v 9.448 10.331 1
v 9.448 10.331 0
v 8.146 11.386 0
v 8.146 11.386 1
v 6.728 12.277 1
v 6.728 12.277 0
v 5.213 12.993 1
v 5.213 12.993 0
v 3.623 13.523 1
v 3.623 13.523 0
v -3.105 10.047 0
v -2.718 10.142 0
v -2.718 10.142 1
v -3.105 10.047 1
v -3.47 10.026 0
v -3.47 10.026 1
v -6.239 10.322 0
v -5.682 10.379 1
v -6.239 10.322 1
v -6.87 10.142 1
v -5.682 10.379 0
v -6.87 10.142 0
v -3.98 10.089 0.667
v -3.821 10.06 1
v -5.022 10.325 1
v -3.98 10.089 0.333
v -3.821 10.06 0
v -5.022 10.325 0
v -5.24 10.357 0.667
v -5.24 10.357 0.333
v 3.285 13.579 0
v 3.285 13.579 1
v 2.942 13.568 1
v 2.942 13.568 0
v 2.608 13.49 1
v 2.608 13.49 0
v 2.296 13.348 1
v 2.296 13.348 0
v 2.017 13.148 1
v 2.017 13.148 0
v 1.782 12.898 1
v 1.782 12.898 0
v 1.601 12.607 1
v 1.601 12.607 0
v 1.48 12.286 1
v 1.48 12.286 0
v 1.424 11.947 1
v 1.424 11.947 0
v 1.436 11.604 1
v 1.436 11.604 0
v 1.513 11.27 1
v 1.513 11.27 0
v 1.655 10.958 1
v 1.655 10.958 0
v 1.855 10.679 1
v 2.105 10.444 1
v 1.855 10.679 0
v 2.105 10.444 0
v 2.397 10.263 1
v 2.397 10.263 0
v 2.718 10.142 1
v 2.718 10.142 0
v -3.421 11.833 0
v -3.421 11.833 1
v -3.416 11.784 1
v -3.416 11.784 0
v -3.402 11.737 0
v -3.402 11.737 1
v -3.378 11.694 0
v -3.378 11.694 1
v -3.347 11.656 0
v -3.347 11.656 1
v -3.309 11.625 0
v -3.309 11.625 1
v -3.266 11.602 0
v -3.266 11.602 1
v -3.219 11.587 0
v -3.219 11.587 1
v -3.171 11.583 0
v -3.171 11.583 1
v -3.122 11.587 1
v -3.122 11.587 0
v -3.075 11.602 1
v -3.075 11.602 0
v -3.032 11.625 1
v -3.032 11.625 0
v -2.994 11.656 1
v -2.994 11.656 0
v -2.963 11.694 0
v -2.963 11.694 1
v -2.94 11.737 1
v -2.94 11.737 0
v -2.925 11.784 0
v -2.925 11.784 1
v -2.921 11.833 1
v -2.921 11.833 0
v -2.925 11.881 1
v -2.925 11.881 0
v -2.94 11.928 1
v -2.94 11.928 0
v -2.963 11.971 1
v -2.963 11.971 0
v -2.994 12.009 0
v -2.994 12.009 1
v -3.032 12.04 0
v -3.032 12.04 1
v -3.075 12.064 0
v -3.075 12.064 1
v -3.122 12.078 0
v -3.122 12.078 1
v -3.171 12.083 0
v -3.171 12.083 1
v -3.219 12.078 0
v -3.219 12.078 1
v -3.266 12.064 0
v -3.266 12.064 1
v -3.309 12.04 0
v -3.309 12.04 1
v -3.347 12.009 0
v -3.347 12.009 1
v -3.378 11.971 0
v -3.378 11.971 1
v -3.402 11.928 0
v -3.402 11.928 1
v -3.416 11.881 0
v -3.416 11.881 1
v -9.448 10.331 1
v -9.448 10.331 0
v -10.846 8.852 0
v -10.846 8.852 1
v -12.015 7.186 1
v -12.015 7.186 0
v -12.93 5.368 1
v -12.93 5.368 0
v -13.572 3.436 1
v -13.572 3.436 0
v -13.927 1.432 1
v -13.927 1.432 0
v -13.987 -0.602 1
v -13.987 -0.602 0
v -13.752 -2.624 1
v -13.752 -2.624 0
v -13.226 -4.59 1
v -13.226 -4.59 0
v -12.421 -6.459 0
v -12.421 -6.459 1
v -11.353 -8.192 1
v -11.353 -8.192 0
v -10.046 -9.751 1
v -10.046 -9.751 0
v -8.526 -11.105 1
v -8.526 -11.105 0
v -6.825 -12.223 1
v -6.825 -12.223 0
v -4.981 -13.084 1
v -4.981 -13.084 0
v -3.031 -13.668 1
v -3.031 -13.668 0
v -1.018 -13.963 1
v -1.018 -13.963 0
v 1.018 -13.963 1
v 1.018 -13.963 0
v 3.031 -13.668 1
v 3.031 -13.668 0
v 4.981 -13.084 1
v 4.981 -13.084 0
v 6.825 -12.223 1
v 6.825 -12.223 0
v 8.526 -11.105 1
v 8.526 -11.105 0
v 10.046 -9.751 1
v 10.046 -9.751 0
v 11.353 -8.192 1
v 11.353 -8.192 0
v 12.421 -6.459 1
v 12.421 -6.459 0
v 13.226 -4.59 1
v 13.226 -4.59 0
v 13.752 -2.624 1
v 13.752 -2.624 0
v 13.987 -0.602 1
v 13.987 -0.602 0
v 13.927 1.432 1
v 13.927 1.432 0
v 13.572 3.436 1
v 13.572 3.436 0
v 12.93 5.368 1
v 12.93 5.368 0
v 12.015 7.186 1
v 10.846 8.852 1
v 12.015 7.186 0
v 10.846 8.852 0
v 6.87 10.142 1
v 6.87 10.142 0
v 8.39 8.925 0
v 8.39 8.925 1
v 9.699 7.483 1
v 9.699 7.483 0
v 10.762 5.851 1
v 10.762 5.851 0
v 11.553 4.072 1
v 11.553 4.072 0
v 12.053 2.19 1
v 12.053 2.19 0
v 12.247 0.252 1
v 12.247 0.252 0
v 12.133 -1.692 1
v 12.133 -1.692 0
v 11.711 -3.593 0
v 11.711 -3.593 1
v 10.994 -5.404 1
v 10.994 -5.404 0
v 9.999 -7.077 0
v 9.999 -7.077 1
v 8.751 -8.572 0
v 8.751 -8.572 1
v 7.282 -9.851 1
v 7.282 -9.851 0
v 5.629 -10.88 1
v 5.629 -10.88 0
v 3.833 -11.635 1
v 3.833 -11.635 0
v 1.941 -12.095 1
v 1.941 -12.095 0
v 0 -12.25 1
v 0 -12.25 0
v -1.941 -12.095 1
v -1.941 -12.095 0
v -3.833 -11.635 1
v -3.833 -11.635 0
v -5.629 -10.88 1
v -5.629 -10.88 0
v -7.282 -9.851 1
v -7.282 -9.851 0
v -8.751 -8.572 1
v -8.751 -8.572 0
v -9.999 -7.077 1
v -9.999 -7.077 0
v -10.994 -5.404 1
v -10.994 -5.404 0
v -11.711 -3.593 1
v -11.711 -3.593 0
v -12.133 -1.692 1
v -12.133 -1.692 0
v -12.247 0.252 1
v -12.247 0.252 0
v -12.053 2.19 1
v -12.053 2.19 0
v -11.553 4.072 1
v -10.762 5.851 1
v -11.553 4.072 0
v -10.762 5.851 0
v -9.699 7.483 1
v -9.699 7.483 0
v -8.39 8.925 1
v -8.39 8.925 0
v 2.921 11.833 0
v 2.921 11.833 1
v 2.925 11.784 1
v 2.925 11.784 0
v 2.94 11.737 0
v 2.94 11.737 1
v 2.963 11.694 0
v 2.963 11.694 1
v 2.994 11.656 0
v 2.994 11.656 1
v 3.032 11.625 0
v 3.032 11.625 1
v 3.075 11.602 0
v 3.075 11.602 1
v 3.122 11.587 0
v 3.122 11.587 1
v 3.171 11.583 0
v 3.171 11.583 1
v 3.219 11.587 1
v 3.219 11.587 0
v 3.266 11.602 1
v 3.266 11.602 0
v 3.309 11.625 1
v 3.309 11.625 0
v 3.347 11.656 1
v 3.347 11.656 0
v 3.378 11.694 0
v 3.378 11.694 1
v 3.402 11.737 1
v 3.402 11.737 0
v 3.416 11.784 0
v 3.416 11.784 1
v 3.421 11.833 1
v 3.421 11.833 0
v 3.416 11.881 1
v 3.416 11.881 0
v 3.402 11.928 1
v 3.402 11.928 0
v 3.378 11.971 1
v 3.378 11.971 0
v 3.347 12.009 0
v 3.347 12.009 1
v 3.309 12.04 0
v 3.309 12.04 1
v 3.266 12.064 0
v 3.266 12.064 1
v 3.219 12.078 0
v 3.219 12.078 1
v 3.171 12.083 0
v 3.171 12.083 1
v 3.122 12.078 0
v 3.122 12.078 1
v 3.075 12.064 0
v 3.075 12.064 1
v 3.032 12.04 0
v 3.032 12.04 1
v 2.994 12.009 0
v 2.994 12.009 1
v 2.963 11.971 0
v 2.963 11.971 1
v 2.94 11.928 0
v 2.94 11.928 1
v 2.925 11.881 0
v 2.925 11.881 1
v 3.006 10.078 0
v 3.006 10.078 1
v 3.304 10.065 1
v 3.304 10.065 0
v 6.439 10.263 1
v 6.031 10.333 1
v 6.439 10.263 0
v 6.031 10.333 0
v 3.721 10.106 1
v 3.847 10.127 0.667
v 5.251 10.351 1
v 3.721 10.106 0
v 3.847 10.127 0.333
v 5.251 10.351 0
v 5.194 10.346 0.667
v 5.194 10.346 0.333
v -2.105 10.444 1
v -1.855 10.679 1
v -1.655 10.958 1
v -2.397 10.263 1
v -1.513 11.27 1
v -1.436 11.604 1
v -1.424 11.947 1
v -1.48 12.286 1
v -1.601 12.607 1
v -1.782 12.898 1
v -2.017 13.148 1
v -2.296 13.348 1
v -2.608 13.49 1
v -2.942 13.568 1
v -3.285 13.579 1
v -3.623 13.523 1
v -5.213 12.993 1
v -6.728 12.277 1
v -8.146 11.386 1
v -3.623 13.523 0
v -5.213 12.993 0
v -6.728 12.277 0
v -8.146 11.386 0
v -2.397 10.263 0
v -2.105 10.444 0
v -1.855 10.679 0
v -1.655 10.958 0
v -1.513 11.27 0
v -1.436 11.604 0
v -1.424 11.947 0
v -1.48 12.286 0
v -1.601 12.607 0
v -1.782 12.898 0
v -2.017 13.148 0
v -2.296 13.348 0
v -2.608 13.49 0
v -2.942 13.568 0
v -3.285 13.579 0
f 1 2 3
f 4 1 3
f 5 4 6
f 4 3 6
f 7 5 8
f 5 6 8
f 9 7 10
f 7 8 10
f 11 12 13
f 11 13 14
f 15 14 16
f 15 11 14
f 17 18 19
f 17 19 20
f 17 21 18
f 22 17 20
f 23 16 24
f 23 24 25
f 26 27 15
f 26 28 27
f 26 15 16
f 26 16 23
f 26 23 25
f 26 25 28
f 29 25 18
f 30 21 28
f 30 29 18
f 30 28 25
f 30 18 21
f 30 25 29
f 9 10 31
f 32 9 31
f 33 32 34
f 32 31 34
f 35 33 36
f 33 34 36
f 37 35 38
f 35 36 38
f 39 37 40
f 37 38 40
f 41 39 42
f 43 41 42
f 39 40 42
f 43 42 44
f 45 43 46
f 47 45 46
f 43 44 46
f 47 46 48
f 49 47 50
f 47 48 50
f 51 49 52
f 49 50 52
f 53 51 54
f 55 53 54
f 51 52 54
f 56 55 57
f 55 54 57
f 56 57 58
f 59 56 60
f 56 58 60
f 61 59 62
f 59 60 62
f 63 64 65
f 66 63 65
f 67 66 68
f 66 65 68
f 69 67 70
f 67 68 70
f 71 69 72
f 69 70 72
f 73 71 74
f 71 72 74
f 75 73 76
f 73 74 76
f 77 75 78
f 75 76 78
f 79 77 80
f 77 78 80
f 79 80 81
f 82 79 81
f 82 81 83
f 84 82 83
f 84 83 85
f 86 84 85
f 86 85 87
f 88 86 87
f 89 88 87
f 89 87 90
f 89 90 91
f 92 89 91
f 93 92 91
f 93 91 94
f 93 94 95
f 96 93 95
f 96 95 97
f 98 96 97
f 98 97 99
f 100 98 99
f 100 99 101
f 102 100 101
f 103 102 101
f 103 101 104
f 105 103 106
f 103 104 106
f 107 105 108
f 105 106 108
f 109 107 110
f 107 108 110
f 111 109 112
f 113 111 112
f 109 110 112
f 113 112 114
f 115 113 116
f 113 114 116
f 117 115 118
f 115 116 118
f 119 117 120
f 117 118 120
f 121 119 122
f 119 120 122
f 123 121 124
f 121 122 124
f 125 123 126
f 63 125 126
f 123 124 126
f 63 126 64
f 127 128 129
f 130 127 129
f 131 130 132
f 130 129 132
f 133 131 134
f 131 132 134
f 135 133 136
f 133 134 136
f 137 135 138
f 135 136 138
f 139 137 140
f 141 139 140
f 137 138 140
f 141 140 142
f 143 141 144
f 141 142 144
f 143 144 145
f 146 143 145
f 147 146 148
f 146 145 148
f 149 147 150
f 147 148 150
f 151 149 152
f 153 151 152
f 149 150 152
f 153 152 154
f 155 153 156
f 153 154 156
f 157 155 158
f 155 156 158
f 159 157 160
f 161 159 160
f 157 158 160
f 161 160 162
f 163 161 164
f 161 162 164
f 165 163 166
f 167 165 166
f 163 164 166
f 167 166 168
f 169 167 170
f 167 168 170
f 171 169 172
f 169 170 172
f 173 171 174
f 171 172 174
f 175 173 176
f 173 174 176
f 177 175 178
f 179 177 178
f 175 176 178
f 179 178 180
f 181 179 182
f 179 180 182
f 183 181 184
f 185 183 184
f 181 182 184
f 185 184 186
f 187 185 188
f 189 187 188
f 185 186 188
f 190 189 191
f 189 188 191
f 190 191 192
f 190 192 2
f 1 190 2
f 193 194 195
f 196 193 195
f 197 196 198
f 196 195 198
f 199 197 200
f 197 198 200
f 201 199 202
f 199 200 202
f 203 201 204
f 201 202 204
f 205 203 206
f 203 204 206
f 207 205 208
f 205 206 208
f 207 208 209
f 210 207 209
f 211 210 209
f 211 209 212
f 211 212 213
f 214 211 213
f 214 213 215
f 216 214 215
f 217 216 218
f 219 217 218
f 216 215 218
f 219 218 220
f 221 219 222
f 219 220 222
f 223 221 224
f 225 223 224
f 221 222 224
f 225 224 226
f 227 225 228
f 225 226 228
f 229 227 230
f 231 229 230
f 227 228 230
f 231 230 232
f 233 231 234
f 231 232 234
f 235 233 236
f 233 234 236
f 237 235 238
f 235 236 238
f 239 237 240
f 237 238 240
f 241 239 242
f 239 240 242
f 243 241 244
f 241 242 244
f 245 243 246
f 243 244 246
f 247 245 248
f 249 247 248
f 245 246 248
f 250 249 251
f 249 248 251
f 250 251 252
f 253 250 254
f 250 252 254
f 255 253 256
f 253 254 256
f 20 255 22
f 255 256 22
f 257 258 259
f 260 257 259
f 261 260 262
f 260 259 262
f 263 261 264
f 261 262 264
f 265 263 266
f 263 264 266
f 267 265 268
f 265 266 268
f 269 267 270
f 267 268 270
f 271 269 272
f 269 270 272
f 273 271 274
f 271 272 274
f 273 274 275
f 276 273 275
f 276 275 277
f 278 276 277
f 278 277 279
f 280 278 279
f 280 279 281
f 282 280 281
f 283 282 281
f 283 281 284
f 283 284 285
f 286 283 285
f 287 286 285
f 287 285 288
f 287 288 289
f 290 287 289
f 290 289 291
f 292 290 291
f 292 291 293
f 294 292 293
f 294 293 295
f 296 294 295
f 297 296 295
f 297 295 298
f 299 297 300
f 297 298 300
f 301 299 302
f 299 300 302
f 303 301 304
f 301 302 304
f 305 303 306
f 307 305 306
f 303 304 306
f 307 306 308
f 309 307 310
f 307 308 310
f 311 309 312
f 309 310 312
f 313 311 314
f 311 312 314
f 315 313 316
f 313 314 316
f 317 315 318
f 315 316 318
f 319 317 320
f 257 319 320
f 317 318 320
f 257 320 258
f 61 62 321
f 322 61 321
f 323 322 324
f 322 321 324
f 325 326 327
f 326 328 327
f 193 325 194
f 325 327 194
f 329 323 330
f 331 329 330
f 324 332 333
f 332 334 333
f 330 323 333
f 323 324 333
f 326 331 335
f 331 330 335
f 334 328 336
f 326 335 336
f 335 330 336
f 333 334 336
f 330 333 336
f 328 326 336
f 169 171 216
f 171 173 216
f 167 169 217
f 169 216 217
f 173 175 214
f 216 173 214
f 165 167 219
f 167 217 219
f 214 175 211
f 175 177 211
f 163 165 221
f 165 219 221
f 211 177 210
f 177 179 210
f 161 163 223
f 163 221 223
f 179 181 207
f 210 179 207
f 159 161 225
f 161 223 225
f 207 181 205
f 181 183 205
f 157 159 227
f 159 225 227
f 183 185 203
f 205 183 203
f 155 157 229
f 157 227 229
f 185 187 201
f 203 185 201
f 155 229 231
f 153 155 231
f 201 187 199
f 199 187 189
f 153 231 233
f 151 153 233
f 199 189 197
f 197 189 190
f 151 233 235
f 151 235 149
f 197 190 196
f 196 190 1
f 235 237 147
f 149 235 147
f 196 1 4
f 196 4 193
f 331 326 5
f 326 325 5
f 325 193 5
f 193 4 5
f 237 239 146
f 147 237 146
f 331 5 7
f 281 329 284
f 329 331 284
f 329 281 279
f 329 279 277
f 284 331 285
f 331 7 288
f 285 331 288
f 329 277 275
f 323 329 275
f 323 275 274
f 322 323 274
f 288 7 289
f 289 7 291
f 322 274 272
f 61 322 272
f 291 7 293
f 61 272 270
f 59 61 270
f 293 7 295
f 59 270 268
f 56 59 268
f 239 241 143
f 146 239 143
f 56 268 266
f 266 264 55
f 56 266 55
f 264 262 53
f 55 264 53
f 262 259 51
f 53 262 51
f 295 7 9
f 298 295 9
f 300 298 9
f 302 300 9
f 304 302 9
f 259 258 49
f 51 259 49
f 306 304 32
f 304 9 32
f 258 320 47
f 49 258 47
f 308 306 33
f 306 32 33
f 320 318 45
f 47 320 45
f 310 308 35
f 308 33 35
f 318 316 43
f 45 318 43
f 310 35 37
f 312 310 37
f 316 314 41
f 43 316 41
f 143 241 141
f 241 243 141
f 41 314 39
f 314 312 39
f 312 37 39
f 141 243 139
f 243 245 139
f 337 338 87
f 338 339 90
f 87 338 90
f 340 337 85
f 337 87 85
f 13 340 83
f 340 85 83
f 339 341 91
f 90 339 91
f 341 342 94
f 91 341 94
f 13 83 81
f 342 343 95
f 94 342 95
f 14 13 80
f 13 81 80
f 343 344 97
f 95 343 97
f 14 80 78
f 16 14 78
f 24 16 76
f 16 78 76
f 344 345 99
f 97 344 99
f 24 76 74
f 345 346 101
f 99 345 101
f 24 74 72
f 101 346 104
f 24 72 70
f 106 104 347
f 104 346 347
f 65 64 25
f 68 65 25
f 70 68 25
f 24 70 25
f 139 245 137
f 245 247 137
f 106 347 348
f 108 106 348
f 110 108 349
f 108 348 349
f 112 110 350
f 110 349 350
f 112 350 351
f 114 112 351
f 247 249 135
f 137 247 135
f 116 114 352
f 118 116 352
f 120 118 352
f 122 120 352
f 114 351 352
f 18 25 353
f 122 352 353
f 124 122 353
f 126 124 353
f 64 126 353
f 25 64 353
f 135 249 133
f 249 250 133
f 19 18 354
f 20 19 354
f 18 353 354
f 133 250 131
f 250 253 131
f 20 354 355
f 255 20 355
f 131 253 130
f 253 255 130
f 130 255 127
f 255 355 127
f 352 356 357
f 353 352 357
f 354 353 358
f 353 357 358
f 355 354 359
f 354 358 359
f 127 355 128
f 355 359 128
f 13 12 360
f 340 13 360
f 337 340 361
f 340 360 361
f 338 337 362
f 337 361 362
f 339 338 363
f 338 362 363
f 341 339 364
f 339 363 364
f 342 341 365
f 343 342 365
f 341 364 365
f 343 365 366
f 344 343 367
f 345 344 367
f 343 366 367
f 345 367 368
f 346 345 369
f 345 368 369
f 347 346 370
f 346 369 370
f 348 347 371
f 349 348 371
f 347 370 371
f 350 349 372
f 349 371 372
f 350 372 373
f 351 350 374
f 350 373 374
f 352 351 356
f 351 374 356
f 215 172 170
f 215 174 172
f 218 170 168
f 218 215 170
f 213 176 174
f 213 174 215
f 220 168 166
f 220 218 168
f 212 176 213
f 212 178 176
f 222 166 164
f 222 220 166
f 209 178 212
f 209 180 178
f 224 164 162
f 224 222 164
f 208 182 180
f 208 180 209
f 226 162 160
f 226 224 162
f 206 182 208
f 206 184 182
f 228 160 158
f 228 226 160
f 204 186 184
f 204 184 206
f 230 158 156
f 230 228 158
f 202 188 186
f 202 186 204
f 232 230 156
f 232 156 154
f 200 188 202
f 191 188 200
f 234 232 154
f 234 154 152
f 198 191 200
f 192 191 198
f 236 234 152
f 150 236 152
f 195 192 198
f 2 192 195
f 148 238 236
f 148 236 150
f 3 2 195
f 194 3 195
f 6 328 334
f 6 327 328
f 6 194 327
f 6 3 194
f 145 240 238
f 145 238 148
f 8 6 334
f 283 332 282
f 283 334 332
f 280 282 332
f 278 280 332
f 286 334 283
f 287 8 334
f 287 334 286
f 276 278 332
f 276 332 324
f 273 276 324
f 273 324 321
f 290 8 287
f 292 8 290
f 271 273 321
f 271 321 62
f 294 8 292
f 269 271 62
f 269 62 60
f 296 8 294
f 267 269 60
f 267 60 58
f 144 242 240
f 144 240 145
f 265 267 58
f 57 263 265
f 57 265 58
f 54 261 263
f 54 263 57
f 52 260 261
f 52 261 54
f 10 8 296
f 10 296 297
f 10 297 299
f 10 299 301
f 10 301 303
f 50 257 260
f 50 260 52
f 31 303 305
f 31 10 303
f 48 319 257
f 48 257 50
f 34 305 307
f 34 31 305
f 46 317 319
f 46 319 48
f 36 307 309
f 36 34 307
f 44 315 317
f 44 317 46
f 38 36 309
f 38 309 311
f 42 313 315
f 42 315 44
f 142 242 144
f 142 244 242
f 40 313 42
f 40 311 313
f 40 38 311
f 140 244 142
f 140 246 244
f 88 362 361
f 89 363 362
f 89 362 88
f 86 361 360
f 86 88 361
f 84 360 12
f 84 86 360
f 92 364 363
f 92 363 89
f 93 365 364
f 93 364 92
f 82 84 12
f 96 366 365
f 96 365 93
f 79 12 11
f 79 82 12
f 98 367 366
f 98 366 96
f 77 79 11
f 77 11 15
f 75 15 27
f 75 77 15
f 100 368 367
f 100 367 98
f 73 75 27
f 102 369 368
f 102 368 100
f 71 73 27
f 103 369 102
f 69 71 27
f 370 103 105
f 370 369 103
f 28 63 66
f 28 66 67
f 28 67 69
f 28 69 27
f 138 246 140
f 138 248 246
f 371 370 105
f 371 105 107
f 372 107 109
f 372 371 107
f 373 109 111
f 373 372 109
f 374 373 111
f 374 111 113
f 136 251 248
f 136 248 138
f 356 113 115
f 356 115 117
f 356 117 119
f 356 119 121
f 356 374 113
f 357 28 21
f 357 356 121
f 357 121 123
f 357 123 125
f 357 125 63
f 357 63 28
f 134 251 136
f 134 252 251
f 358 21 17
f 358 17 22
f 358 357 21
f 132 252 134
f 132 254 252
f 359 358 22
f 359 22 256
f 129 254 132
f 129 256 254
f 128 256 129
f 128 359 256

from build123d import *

# Parameters (mm, degrees)
F1_DEPTH = 1
F2_D     = 0.5
F2_DEPTH = 17
F2_TIP   = 0.1502151548


with BuildPart() as f1:
    # F0 (on Top) → F1 (new body)
    with BuildSketch(Plane.XY):
        with BuildLine():
            add(Edge.make_bspline(
                [(-6.8700691129, 10.142221176), (-8.399545307, 9.5712927005), (-10.6213726103, 7.7990288846), (-9.4482654422, 10.3310348046)],
                knots=[0.5589666429, 0.5589666429, 0.5589666429, 0.5589666429, 1, 1, 1, 1], degree=3))
            add(Edge.make_bspline(
                [(-2.7175999736, 10.142221176), (-4.1052754968, 9.659698233), (-4.9316076337, 10.8658171767), (-6.8700691129, 10.142221176)],
                knots=[0, 0, 0, 0, 0.5589666429, 0.5589666429, 0.5589666429, 0.5589666429], degree=3))
            Line((-2.7175999736, 10.142221176), (-3.6234666314, 13.522961568))
            ThreePointArc((-3.6234666314, 13.522961568), (-6.727900413, 12.2774327949), (-9.4482654422, 10.3310348046))
        make_face()
        with BuildLine():
            ThreePointArc((6.8700691129, 10.142221176), (0, -12.25), (-6.8700691129, 10.142221176))
            add(Edge.make_bspline(
                [(-6.8700691129, 10.142221176), (-8.399545307, 9.5712927005), (-10.6213726103, 7.7990288846), (-9.4482654422, 10.3310348046)],
                knots=[0.5589666429, 0.5589666429, 0.5589666429, 0.5589666429, 1, 1, 1, 1], degree=3))
            ThreePointArc((-9.4482654422, 10.3310348046), (0, -14), (9.4482654422, 10.3310348046))
            add(Edge.make_bspline(
                [(6.8700691129, 10.142221176), (8.3520722793, 9.6407168218), (10.2458875626, 8.1284232438), (9.4482654422, 10.3310348046)],
                knots=[0.5589666429, 0.5589666429, 0.5589666429, 0.5589666429, 1, 1, 1, 1], degree=3))
        make_face()
        with BuildLine():
            add(Edge.make_bspline(
                [(2.7175999736, 10.142221176), (3.7749782205, 9.7897974774), (4.9917750531, 10.7778288933), (6.8700691129, 10.142221176)],
                knots=[0, 0, 0, 0, 0.5589666429, 0.5589666429, 0.5589666429, 0.5589666429], degree=3))
            add(Edge.make_bspline(
                [(6.8700691129, 10.142221176), (8.3520722793, 9.6407168218), (10.2458875626, 8.1284232438), (9.4482654422, 10.3310348046)],
                knots=[0.5589666429, 0.5589666429, 0.5589666429, 0.5589666429, 1, 1, 1, 1], degree=3))
            ThreePointArc((9.4482654422, 10.3310348046), (6.727900413, 12.2774327949), (3.6234666314, 13.522961568))
            Line((3.6234666314, 13.522961568), (2.7175999736, 10.142221176))
        make_face()
        with BuildLine():
            Line((-3.6234666314, 13.522961568), (-2.7175999736, 10.142221176))
            ThreePointArc((-2.7175999736, 10.142221176), (-1.4801631065, 12.285524701), (-3.6234666314, 13.522961568))
        make_face()
        with BuildLine():
            ThreePointArc((3.6234666314, 13.522961568), (1.4801631065, 12.285524701), (2.7175999736, 10.142221176))
            Line((2.7175999736, 10.142221176), (3.6234666314, 13.522961568))
        make_face()
    extrude(amount=F1_DEPTH)

    # F2
    with Locations(Plane(origin=(0, 0, 0), x_dir=(1, 0, 0), z_dir=(0, 0, -1))):
        with Locations((-3.1705333025, -11.832591372), (3.1705333025, -11.832591372)):
            Hole(F2_D / 2, depth=F2_DEPTH)
            with Locations((0, 0, -(F2_DEPTH + F2_TIP / 2))):  # 118° drill point
                Cone(0, F2_D / 2, F2_TIP, mode=Mode.SUBTRACT)


solid = f1.part
